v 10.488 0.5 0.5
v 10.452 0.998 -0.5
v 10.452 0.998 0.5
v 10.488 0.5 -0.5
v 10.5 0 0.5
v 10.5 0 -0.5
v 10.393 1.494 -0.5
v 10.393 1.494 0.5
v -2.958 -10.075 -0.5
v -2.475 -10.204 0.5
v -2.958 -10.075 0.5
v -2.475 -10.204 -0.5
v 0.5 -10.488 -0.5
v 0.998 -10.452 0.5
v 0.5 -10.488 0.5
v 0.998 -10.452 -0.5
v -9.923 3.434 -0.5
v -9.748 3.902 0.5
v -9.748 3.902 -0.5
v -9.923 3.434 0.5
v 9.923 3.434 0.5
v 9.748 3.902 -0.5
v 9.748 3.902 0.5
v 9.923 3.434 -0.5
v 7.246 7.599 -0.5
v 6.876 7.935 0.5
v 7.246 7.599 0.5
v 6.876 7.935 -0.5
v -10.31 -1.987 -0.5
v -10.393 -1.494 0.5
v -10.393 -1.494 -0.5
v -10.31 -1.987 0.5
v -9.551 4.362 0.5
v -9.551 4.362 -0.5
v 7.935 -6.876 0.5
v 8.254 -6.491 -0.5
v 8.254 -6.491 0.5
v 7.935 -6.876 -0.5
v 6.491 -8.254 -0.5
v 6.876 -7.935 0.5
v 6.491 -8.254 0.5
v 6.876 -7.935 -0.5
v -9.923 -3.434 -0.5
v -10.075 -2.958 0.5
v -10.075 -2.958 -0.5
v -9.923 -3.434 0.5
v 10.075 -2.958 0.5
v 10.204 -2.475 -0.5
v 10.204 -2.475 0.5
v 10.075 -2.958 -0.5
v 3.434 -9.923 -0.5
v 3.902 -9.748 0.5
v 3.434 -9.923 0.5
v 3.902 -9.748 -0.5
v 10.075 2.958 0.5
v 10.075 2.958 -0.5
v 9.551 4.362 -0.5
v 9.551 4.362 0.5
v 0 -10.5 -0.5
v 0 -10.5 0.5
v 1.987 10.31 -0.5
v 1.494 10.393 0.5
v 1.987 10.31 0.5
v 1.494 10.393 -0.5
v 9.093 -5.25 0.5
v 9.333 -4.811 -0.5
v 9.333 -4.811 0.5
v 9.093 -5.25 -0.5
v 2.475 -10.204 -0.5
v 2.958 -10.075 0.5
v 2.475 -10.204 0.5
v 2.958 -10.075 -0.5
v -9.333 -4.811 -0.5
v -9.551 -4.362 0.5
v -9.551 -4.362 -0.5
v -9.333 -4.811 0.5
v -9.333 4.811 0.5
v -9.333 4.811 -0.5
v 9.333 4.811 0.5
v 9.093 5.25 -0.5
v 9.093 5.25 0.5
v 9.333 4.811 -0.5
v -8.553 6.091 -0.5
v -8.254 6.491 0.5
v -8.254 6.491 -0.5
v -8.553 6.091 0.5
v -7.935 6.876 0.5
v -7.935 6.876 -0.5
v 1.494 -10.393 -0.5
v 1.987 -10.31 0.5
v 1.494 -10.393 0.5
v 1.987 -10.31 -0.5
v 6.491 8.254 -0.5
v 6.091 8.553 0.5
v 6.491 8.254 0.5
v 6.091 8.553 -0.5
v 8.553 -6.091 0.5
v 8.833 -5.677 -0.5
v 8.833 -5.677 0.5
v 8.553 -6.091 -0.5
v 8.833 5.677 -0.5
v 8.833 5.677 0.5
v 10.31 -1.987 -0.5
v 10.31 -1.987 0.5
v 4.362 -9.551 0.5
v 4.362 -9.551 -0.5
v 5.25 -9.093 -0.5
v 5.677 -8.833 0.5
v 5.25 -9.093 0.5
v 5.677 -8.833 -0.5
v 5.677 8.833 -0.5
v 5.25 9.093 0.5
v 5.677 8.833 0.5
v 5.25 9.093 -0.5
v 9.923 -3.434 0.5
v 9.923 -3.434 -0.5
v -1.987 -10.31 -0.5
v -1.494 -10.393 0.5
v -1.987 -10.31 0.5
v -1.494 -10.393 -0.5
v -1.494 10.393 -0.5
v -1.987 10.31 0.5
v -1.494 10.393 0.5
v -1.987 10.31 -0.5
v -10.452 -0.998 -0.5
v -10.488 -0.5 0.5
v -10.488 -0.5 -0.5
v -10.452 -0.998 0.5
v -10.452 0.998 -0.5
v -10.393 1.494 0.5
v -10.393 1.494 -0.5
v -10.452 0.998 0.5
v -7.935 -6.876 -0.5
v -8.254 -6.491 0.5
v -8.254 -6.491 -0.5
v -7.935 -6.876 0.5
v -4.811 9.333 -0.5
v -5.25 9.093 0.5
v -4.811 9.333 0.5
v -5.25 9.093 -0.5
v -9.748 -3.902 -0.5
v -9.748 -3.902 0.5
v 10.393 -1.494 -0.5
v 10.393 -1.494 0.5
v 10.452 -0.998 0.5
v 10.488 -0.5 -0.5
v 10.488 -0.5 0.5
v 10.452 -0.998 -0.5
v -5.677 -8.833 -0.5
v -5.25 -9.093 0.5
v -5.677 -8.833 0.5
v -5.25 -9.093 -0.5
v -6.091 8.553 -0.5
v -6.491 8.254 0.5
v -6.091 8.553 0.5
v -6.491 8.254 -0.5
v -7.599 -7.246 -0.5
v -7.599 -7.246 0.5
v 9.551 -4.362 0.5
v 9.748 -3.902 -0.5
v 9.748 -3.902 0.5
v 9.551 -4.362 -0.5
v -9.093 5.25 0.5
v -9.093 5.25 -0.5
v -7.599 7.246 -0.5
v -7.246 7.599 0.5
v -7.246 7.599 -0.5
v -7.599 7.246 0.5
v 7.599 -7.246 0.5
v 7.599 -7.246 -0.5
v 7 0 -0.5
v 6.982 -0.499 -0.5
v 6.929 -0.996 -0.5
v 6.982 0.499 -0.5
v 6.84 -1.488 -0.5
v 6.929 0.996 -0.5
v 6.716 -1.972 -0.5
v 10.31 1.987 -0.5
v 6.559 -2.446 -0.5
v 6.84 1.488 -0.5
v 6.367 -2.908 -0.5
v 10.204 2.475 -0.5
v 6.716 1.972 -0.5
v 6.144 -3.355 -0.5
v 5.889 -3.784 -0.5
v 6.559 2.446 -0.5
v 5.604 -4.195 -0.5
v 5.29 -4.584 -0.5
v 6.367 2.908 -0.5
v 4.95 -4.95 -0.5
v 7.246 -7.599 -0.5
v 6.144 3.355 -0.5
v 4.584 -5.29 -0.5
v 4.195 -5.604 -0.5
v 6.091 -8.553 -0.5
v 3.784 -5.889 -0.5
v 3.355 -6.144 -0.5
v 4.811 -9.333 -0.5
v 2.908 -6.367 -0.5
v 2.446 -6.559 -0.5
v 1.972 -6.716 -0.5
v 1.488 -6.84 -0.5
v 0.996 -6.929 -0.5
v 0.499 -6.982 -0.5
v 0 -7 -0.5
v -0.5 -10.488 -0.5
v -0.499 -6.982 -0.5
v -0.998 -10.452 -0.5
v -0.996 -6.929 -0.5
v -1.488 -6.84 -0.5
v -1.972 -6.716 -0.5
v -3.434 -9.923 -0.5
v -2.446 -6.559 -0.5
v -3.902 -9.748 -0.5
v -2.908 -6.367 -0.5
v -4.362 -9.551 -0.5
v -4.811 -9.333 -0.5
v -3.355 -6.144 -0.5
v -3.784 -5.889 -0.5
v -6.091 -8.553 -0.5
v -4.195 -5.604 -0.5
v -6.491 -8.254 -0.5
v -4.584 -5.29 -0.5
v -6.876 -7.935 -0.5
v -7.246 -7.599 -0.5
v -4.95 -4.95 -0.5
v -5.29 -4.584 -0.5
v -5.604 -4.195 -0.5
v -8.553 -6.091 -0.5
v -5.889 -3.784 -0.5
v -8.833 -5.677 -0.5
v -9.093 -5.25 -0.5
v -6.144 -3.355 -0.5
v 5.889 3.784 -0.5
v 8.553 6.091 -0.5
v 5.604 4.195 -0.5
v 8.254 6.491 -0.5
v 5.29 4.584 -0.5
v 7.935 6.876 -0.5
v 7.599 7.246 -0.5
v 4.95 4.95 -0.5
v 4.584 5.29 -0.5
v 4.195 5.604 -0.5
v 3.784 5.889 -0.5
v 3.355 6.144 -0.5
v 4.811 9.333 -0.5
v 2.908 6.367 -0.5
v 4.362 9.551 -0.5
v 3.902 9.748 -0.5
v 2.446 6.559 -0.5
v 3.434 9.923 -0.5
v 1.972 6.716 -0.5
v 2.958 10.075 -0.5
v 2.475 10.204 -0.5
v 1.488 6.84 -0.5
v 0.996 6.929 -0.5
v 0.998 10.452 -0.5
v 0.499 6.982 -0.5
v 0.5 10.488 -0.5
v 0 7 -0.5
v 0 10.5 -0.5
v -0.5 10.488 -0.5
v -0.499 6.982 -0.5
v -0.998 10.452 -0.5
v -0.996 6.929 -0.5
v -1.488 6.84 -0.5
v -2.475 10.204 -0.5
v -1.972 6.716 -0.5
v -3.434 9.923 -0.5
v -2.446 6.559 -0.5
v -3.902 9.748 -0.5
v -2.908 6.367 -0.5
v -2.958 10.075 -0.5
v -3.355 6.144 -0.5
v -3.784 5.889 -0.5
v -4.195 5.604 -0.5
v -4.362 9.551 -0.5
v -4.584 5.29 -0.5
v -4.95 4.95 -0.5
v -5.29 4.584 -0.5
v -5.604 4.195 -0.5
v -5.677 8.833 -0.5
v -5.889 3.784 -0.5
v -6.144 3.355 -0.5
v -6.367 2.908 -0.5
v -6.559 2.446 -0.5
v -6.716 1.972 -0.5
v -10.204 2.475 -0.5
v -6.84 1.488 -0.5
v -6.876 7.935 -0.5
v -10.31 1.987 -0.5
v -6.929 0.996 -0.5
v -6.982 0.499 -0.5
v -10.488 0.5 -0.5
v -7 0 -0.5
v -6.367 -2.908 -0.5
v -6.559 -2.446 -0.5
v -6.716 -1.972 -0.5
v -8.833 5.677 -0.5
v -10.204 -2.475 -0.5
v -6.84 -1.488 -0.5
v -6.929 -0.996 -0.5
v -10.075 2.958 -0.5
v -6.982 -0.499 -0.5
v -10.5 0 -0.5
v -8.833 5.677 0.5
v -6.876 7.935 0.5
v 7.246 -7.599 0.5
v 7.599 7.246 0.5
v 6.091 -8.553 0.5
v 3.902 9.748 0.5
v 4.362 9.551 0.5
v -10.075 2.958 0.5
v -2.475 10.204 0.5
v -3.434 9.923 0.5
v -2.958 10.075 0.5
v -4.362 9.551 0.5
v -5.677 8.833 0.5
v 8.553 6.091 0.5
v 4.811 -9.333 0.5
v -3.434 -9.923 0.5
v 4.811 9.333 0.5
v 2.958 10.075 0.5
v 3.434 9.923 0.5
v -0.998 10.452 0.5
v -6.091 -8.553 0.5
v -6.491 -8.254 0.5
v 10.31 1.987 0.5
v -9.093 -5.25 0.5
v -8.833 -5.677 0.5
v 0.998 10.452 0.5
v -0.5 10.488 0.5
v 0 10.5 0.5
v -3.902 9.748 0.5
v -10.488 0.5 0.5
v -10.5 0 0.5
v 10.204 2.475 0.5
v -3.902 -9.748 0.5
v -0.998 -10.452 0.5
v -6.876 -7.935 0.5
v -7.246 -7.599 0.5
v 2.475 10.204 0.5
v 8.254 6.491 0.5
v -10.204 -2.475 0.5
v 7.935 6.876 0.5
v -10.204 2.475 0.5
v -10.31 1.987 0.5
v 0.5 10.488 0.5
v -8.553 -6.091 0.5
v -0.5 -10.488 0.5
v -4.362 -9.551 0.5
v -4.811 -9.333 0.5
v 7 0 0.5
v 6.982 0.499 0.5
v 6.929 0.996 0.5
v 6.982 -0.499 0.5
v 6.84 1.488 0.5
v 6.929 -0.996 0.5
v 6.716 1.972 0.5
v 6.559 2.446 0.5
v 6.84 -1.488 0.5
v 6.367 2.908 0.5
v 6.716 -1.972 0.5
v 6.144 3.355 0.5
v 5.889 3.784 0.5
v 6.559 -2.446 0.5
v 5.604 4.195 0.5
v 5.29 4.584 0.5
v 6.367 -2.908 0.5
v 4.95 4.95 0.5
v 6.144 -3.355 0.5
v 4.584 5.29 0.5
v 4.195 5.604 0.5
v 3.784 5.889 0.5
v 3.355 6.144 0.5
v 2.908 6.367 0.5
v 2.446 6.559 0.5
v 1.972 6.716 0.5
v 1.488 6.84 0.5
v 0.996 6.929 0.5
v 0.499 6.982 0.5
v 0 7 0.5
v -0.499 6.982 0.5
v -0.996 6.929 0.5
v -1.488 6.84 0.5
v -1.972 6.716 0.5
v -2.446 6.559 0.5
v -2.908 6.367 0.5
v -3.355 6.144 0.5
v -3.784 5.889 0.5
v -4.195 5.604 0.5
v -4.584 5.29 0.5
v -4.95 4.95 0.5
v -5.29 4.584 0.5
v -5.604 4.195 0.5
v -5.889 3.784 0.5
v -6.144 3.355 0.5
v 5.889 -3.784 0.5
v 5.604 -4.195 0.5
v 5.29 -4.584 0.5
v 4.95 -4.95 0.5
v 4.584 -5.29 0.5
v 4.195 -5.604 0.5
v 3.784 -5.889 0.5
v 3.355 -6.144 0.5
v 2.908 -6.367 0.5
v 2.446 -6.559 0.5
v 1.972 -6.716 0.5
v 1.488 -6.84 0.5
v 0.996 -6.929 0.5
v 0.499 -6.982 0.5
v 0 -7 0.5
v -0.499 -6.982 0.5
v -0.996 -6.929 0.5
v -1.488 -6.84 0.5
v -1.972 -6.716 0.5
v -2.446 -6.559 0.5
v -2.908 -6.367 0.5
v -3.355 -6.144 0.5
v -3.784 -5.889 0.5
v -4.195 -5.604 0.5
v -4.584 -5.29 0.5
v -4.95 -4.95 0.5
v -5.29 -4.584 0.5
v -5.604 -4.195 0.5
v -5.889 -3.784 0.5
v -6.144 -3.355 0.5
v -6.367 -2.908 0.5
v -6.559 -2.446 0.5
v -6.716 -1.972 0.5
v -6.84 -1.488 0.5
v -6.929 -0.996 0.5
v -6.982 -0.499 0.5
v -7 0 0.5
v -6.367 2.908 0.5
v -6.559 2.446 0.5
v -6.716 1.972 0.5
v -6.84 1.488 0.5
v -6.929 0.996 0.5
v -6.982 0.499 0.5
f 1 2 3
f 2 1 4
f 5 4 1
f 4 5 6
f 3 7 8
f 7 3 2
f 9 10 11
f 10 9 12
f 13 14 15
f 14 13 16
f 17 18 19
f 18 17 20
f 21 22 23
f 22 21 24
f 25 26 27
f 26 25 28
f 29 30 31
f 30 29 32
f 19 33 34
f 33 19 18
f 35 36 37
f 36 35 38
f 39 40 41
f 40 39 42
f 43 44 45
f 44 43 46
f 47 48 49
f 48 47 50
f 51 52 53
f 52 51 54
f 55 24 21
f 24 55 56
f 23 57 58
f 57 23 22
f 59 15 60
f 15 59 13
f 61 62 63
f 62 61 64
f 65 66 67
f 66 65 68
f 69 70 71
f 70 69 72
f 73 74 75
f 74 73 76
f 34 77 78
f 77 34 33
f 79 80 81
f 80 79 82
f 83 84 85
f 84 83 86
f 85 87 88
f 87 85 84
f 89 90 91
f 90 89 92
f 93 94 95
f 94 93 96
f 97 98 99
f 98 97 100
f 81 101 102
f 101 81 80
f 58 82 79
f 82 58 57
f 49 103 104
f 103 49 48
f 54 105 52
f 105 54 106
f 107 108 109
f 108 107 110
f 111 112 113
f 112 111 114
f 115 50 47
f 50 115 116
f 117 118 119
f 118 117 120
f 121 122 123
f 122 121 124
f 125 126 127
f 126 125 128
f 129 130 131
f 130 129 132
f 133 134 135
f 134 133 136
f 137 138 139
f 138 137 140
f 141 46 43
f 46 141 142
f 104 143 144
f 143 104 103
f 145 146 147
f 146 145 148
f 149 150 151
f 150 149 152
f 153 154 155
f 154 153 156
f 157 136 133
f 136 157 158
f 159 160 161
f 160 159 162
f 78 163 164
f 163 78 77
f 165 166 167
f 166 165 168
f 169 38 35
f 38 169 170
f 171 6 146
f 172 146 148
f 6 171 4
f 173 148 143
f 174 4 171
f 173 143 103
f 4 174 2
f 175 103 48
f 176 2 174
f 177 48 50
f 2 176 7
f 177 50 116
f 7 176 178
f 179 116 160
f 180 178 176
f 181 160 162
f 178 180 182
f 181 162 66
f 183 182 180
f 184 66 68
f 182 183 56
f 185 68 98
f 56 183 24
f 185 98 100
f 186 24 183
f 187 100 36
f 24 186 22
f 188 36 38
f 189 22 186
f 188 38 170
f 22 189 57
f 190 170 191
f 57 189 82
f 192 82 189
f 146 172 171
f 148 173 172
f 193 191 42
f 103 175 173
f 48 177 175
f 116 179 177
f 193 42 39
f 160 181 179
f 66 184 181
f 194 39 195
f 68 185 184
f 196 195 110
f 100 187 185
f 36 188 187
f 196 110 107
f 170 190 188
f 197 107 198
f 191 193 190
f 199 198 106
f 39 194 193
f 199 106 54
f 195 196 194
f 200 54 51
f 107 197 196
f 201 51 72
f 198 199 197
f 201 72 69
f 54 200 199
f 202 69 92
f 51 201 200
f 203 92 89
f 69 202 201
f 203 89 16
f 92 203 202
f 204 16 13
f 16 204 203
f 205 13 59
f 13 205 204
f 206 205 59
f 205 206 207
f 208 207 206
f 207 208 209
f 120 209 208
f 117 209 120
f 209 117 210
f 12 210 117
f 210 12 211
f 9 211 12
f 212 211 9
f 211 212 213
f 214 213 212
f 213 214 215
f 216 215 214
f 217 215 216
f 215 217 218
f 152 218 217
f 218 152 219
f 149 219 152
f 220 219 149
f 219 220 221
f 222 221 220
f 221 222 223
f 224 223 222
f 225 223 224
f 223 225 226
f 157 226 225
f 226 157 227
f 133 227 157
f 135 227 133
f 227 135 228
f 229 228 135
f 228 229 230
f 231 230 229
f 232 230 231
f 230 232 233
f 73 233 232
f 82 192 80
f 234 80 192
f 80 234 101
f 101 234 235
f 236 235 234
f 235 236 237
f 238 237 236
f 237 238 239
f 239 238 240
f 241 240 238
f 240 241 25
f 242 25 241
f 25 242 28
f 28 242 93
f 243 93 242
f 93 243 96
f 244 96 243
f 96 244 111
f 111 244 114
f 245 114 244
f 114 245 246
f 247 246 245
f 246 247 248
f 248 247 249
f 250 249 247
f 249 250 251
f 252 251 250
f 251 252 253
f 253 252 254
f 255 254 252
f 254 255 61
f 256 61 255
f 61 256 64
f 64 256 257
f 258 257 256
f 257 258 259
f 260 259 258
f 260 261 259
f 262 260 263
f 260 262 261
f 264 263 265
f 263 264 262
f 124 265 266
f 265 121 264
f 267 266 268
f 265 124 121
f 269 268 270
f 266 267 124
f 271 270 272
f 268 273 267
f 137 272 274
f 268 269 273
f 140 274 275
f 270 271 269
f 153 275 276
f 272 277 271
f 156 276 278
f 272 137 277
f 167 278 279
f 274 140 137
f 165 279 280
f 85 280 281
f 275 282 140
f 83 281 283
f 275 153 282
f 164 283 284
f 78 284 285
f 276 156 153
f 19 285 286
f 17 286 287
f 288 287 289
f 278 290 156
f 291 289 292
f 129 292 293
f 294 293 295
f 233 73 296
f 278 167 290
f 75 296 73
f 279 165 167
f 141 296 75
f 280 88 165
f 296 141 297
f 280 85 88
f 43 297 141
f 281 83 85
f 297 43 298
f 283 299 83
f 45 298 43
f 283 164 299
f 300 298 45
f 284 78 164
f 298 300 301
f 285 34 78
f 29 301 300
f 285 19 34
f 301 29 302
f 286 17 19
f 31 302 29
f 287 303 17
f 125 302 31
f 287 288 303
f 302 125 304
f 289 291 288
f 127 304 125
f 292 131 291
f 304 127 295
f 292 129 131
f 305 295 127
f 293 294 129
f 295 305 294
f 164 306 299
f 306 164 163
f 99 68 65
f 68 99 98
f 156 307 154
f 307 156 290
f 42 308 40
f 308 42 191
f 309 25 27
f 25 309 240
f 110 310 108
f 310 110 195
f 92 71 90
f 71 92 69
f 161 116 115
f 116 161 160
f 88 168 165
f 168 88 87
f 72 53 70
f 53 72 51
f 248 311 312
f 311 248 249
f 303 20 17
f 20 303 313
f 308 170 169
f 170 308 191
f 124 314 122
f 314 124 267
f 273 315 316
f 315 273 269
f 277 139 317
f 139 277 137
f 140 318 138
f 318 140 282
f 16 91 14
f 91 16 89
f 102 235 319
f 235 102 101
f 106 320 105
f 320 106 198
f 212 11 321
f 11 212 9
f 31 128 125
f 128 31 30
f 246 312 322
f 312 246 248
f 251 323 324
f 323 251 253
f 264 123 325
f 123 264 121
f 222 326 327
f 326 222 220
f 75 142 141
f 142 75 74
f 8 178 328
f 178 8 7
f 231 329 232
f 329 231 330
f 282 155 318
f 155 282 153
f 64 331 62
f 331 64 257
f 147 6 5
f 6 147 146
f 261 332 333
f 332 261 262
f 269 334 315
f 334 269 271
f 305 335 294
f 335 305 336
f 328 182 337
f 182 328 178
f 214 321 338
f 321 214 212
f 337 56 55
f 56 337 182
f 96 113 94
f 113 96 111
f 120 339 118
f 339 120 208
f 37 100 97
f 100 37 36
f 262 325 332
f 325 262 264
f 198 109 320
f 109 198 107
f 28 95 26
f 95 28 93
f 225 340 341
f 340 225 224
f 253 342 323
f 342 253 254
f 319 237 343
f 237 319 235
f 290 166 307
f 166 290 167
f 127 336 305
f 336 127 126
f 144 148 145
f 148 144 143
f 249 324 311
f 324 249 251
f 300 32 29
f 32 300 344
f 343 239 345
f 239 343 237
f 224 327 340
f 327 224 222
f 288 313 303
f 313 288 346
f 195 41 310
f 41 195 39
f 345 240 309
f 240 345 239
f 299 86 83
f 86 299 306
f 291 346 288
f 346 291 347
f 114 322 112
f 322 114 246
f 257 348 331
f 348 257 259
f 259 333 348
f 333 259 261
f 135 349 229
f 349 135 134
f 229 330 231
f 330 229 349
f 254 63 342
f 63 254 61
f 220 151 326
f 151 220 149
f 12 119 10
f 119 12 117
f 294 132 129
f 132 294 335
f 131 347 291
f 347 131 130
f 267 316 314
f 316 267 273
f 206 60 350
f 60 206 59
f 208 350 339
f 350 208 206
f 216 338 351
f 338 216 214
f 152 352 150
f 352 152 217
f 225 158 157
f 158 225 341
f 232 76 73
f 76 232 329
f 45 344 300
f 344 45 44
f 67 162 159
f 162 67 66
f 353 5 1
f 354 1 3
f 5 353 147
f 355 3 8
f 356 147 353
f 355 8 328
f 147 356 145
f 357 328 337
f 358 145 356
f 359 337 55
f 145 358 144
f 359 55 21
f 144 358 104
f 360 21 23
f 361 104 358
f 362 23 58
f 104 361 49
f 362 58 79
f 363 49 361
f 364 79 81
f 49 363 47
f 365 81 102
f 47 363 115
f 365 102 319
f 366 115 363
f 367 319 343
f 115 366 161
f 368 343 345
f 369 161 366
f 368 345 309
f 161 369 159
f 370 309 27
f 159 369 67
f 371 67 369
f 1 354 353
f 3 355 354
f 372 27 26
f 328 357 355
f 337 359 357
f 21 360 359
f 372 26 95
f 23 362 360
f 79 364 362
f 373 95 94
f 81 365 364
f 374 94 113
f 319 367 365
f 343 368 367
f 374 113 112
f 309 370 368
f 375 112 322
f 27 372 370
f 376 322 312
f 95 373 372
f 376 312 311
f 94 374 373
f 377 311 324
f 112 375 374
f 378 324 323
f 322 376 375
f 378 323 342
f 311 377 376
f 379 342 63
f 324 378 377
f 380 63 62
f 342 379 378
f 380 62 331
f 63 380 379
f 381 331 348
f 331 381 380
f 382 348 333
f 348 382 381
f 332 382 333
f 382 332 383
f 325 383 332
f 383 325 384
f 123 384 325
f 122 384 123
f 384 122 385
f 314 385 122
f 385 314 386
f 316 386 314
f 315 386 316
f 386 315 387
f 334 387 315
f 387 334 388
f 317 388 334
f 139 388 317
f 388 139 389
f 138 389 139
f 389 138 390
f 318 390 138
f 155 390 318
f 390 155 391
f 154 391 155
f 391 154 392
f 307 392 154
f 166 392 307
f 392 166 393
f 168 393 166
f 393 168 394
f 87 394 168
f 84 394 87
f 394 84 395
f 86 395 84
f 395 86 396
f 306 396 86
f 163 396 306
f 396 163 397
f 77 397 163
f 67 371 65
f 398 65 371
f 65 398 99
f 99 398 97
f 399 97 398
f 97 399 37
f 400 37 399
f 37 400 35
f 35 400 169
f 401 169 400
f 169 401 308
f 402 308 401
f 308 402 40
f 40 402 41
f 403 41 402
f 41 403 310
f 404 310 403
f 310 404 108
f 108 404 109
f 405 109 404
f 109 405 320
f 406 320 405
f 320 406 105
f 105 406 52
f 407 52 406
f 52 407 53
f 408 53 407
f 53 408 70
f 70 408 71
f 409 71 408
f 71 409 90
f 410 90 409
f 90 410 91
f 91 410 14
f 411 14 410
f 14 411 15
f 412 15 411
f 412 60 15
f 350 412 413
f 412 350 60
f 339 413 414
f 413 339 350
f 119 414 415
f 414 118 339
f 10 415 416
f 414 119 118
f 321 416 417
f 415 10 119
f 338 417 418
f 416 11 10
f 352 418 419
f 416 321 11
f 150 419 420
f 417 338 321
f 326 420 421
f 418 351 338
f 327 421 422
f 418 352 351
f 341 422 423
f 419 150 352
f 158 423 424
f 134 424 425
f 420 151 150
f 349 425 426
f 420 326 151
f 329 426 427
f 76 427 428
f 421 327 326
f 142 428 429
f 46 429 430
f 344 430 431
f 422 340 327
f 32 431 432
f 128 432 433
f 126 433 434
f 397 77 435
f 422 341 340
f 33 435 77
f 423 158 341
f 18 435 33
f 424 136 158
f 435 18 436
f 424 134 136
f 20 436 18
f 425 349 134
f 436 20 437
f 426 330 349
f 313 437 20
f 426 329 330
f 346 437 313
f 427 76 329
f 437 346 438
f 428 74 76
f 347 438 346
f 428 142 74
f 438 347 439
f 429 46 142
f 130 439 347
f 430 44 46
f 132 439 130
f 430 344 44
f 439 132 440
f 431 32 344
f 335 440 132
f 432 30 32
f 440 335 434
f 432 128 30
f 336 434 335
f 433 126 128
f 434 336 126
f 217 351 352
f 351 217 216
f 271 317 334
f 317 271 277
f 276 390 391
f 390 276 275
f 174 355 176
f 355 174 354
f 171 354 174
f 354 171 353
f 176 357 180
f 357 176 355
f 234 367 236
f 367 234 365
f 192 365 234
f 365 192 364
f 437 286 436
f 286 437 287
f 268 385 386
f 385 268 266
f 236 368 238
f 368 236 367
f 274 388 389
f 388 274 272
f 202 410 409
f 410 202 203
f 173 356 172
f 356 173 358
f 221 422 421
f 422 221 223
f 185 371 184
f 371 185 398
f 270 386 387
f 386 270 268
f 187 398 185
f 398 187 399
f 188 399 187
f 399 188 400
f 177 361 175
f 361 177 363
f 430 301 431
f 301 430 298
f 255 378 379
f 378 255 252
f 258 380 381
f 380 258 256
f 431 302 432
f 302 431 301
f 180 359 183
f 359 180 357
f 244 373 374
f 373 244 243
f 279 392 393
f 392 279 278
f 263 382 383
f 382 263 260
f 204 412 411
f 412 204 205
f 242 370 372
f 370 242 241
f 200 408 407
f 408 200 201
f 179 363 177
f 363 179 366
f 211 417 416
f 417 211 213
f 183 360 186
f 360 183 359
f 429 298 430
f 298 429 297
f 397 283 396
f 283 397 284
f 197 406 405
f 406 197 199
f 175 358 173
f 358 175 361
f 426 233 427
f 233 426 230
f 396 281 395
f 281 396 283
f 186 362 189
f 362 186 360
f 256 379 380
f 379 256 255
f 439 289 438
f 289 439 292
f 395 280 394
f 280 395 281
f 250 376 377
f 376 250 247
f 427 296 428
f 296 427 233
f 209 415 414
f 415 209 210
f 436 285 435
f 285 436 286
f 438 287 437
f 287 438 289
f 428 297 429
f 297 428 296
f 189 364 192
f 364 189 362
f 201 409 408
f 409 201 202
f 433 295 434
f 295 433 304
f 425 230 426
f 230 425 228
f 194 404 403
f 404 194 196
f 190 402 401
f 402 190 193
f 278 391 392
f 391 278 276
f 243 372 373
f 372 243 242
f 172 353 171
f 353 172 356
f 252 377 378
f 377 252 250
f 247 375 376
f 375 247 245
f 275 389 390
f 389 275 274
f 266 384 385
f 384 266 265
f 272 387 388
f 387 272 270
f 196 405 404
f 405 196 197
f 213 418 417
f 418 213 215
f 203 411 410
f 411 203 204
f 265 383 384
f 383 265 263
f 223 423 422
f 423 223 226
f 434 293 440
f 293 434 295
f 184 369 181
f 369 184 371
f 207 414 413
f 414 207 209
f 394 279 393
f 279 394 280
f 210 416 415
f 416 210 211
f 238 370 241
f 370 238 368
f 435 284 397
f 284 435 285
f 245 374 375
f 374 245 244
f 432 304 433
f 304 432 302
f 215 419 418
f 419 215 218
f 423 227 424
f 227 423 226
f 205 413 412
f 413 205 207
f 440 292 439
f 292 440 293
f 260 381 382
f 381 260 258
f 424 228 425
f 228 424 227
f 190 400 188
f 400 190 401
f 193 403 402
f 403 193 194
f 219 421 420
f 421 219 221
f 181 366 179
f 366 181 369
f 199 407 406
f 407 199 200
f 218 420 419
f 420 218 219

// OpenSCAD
// washer dimentions
od = 21;
id = 14;
h = 1;

$fa=.5;
$fs = .5;

difference(){
    cylinder(r=od/2,h=h,center=true);
	cylinder(r=id/2,h=h+1,center=true);
}
